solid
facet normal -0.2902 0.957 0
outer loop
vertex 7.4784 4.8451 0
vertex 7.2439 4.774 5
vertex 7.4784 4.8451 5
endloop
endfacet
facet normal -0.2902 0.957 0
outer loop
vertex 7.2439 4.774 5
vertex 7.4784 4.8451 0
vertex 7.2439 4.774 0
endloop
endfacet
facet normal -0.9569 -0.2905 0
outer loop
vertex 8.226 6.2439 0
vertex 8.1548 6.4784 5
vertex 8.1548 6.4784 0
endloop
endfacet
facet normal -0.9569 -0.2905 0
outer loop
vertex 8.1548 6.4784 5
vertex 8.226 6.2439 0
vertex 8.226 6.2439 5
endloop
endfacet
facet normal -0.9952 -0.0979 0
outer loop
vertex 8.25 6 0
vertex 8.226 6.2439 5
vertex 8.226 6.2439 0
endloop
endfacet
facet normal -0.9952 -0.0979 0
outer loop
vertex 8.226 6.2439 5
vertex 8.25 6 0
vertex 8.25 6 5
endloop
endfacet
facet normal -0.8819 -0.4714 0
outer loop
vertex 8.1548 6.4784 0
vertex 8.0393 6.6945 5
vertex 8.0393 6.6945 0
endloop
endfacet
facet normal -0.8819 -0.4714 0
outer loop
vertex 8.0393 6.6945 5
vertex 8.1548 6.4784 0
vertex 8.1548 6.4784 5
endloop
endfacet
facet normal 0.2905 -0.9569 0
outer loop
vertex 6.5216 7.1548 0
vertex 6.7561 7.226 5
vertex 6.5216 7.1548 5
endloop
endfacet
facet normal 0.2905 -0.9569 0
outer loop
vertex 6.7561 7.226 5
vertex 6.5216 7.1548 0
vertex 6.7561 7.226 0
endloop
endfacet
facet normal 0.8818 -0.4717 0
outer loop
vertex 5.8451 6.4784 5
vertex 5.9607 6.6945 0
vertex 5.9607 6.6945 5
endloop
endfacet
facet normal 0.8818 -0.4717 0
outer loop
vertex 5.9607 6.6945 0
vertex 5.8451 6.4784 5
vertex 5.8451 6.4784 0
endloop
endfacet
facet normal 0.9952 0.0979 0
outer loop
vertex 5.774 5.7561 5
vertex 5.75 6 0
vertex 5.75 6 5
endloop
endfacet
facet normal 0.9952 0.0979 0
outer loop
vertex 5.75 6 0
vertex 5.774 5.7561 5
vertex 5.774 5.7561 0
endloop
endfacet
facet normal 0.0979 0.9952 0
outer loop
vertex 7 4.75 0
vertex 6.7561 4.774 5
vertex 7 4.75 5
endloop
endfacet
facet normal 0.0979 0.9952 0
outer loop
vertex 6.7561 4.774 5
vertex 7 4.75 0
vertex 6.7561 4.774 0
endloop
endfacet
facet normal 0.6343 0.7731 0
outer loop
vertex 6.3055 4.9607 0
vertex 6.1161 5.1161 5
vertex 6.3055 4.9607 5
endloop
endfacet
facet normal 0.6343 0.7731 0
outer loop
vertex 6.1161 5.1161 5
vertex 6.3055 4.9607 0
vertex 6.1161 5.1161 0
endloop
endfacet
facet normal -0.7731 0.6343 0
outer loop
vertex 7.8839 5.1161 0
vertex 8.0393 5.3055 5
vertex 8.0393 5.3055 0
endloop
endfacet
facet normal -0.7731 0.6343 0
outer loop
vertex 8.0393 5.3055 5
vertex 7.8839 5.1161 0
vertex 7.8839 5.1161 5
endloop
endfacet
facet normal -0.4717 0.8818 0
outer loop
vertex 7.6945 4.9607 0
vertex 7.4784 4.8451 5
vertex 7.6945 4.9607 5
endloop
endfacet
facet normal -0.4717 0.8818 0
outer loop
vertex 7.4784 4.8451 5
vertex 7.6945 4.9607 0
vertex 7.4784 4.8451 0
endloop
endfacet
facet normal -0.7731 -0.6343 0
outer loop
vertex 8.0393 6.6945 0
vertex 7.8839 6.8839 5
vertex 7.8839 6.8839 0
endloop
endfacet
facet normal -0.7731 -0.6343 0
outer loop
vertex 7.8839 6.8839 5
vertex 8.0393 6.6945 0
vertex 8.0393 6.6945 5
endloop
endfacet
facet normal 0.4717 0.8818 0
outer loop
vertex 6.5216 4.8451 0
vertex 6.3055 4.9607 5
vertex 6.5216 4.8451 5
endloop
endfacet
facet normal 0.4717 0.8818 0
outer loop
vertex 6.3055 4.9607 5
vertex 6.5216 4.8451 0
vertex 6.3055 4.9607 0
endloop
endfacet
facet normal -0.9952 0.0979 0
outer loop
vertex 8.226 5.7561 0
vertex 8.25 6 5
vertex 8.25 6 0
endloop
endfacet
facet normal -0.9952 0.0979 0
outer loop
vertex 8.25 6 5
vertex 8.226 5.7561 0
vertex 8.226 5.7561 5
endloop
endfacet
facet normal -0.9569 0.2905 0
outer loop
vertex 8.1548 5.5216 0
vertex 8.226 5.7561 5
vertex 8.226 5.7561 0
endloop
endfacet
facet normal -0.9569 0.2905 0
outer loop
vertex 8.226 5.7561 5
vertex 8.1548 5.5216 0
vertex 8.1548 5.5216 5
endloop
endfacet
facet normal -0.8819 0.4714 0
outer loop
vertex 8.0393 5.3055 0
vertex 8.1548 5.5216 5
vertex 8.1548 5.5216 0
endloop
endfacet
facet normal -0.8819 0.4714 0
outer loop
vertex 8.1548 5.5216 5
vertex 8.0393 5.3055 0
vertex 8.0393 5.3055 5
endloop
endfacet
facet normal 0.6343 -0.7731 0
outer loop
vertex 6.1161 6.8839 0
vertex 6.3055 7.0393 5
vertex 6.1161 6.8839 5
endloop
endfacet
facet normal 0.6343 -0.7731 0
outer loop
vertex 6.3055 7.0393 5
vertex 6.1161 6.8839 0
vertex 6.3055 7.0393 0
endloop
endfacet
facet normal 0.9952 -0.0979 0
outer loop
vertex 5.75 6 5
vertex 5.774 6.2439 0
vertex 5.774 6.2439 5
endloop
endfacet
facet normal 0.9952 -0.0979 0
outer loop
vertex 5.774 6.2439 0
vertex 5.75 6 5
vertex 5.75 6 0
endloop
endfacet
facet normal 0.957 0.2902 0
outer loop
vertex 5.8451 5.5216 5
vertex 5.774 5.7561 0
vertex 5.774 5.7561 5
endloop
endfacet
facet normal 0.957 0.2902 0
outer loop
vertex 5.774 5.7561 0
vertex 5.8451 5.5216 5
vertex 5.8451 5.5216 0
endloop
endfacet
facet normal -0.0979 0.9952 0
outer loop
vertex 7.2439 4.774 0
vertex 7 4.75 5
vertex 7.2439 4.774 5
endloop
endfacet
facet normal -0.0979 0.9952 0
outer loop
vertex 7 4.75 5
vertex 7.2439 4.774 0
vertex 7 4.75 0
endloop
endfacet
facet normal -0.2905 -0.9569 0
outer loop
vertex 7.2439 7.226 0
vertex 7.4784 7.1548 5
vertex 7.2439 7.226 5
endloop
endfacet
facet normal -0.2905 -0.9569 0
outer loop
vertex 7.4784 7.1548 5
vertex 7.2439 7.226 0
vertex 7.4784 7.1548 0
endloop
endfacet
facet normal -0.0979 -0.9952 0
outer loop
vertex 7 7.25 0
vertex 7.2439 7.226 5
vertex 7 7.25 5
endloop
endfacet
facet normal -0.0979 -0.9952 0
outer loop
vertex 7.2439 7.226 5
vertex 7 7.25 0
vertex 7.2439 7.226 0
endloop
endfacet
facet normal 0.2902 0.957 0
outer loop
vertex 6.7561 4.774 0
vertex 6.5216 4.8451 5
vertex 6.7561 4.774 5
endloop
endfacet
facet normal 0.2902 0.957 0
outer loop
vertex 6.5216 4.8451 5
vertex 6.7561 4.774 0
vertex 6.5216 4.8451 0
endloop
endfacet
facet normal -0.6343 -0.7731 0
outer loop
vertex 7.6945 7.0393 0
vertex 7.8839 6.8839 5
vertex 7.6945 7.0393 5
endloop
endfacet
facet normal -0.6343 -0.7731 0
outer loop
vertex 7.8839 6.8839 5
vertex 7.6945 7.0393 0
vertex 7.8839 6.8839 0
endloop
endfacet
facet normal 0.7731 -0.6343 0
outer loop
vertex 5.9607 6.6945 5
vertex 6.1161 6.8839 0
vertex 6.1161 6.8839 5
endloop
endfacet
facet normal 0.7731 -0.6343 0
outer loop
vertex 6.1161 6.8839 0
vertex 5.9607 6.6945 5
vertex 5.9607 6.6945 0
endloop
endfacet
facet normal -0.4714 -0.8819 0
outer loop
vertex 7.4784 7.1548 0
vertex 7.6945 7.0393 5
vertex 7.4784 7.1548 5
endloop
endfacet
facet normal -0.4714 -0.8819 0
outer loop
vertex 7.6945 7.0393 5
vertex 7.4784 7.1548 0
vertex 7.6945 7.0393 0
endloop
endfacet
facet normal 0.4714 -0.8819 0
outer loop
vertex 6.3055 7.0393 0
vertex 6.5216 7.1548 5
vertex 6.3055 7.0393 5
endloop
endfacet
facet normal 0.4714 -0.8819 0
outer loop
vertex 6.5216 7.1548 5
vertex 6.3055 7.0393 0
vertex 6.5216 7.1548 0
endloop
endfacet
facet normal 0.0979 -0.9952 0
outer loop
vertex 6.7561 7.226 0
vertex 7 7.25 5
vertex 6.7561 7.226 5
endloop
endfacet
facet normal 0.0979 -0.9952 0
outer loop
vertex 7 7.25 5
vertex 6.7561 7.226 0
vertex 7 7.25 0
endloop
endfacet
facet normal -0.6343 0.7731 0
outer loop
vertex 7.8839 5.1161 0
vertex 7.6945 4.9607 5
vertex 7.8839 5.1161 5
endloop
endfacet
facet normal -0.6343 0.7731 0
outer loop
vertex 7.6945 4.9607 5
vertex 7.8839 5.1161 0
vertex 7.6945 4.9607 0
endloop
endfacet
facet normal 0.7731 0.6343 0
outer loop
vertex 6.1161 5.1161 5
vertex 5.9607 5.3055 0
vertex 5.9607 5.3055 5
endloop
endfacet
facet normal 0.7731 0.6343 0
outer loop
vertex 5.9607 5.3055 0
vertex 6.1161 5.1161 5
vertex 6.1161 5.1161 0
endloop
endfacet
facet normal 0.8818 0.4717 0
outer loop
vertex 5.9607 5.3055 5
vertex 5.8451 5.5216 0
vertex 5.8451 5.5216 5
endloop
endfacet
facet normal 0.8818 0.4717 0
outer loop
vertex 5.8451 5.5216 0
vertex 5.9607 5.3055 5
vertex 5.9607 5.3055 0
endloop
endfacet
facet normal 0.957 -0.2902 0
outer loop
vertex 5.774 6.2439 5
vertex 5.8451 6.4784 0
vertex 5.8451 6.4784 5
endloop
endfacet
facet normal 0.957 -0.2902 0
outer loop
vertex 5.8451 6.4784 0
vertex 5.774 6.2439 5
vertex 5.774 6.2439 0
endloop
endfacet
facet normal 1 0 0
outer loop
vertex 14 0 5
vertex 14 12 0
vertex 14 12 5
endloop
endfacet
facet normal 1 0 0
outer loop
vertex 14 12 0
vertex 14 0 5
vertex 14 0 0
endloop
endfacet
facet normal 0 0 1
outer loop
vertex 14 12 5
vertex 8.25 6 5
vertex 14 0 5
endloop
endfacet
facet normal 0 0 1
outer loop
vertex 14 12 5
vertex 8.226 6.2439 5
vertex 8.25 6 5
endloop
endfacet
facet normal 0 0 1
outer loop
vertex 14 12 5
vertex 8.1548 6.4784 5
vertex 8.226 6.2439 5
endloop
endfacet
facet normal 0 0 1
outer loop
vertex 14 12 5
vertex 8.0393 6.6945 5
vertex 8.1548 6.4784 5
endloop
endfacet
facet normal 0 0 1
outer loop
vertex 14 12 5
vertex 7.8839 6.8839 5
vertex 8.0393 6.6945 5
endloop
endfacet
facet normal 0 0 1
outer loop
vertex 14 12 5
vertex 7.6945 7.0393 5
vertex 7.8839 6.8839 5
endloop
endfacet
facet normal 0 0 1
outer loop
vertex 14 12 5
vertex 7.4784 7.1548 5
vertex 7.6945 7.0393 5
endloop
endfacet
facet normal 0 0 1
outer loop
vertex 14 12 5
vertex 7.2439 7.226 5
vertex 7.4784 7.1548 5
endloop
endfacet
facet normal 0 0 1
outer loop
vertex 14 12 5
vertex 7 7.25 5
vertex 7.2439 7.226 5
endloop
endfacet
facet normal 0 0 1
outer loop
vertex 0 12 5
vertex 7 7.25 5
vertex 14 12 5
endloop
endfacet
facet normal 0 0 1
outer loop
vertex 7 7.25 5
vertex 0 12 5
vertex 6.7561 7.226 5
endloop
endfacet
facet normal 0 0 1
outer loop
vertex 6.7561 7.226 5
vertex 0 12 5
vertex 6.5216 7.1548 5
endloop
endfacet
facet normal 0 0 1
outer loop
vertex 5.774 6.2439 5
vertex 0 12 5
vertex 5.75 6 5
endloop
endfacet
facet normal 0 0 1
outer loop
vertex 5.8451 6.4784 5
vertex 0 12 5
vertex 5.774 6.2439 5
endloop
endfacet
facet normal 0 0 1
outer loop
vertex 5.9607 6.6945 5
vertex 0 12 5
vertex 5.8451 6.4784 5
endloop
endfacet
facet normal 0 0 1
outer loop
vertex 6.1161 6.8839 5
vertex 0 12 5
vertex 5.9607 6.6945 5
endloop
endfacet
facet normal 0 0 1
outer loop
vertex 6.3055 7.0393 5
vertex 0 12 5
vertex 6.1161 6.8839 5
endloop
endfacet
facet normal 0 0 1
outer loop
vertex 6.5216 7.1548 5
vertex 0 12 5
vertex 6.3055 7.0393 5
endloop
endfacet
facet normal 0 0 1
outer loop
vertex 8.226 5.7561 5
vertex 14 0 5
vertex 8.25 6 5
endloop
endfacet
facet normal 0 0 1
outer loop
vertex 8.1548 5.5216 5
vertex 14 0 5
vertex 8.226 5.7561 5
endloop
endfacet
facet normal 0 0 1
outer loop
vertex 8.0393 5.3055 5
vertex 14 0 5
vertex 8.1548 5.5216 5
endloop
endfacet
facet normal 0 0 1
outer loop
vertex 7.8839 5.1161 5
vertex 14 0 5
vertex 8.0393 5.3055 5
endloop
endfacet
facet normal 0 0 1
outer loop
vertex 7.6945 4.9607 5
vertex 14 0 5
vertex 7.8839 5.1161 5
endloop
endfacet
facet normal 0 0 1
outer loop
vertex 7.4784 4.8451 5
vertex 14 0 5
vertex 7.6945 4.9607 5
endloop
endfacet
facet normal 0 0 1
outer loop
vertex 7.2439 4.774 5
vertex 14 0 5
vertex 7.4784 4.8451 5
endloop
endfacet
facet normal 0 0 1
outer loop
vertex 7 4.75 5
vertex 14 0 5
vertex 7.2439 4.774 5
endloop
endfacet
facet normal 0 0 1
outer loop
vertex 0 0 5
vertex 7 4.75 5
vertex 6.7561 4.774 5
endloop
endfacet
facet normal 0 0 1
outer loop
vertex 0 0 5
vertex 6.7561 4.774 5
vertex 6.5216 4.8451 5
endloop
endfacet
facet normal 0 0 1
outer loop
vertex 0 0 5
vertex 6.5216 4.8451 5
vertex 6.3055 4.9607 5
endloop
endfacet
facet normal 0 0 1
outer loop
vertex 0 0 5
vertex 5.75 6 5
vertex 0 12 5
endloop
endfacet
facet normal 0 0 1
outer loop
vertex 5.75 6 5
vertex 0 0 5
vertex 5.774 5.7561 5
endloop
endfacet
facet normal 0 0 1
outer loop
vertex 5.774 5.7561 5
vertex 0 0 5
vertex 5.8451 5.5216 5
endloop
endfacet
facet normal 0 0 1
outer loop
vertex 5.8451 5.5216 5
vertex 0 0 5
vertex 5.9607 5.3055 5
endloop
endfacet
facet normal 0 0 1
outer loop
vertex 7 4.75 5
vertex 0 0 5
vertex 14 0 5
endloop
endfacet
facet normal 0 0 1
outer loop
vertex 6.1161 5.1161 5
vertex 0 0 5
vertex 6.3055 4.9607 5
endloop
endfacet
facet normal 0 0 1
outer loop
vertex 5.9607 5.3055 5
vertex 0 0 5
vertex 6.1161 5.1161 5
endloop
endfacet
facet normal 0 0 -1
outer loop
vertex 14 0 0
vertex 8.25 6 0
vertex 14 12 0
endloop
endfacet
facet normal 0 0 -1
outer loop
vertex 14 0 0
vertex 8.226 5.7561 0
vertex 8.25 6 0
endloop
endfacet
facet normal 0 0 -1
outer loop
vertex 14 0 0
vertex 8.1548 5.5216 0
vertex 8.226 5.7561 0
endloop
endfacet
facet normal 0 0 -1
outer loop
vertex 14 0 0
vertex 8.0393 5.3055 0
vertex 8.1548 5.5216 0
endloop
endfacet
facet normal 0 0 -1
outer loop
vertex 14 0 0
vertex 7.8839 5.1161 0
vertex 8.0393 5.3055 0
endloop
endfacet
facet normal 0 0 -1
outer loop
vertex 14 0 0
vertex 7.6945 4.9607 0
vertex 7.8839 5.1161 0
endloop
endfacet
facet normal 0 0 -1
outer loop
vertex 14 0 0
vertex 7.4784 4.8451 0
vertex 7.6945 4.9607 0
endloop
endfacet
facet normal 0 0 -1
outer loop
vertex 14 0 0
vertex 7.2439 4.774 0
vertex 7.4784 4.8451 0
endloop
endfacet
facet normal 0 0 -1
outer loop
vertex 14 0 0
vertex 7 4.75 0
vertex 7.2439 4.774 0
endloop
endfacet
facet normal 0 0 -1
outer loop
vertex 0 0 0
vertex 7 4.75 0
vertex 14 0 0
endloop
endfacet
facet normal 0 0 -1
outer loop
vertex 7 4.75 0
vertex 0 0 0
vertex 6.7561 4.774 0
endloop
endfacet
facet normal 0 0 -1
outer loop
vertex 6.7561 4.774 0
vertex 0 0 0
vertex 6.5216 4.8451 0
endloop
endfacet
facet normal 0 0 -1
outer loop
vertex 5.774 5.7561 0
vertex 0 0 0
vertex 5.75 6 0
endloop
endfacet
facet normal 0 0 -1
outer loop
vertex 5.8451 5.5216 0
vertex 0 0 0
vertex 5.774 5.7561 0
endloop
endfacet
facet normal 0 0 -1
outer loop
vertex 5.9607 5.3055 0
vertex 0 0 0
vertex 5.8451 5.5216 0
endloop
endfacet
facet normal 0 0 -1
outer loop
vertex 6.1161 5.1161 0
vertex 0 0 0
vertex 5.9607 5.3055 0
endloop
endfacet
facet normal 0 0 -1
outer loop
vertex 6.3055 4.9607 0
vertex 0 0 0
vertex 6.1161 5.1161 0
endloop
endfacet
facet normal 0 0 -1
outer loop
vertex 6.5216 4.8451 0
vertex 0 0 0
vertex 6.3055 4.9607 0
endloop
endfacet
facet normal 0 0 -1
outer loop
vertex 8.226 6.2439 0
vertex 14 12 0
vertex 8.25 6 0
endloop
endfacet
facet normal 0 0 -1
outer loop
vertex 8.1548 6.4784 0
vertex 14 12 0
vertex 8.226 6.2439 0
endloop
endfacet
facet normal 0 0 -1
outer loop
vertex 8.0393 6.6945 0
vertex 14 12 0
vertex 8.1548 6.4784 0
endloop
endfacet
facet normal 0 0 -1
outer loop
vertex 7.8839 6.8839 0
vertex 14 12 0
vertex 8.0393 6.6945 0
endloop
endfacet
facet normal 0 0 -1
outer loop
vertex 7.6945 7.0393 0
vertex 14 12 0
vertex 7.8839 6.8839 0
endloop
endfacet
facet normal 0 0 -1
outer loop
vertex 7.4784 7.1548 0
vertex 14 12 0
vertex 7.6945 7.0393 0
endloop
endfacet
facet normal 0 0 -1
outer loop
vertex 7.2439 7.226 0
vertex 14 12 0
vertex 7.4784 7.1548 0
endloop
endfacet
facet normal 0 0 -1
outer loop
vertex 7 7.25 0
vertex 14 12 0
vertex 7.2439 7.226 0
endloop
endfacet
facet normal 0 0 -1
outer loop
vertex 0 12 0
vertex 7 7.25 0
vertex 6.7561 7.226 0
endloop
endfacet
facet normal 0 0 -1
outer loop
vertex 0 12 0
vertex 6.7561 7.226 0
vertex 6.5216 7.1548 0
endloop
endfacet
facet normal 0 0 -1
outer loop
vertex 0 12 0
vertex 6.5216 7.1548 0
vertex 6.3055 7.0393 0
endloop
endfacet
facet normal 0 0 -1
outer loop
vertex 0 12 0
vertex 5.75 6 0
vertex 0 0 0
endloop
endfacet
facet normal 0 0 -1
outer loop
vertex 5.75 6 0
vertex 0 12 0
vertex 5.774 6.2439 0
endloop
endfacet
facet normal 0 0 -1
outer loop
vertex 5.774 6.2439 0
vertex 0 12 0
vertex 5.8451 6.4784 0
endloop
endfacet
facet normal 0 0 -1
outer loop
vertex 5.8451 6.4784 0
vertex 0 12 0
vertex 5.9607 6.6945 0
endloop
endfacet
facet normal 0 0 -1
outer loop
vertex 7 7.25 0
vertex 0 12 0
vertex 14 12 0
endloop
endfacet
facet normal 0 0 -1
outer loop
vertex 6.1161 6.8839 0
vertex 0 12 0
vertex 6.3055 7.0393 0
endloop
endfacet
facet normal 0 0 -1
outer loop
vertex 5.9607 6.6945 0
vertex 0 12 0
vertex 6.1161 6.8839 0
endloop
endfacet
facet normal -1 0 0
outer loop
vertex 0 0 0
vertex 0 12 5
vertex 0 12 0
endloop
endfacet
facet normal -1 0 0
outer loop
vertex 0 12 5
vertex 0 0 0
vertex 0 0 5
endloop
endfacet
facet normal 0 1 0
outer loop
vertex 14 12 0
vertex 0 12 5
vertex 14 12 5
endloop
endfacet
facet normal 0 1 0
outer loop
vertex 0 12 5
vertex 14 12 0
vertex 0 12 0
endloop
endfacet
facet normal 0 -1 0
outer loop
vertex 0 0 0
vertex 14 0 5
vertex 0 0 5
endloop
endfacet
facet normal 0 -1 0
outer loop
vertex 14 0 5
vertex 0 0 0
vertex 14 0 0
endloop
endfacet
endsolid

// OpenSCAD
$fn = 32;

// ----------------------------------------------------------------------
// Micro pad: two-hole pad, 5-20 mm class
// ----------------------------------------------------------------------

// --- parameters (mm) ---
pad_l = 14;               // pad length, X
pad_w = 12;               // pad width, Y
pad_t = 5;                // pad thickness, Z
hole_d = 2.5;             // hole diameter
hole_x = 7;               // X of the first hole centre

difference() {
  cube([pad_l, pad_w, pad_t]);
  for (x = [hole_x, pad_l - hole_x])
    translate([x, pad_w / 2, -1])
      cylinder(h = pad_t + 2, d = hole_d);
}
